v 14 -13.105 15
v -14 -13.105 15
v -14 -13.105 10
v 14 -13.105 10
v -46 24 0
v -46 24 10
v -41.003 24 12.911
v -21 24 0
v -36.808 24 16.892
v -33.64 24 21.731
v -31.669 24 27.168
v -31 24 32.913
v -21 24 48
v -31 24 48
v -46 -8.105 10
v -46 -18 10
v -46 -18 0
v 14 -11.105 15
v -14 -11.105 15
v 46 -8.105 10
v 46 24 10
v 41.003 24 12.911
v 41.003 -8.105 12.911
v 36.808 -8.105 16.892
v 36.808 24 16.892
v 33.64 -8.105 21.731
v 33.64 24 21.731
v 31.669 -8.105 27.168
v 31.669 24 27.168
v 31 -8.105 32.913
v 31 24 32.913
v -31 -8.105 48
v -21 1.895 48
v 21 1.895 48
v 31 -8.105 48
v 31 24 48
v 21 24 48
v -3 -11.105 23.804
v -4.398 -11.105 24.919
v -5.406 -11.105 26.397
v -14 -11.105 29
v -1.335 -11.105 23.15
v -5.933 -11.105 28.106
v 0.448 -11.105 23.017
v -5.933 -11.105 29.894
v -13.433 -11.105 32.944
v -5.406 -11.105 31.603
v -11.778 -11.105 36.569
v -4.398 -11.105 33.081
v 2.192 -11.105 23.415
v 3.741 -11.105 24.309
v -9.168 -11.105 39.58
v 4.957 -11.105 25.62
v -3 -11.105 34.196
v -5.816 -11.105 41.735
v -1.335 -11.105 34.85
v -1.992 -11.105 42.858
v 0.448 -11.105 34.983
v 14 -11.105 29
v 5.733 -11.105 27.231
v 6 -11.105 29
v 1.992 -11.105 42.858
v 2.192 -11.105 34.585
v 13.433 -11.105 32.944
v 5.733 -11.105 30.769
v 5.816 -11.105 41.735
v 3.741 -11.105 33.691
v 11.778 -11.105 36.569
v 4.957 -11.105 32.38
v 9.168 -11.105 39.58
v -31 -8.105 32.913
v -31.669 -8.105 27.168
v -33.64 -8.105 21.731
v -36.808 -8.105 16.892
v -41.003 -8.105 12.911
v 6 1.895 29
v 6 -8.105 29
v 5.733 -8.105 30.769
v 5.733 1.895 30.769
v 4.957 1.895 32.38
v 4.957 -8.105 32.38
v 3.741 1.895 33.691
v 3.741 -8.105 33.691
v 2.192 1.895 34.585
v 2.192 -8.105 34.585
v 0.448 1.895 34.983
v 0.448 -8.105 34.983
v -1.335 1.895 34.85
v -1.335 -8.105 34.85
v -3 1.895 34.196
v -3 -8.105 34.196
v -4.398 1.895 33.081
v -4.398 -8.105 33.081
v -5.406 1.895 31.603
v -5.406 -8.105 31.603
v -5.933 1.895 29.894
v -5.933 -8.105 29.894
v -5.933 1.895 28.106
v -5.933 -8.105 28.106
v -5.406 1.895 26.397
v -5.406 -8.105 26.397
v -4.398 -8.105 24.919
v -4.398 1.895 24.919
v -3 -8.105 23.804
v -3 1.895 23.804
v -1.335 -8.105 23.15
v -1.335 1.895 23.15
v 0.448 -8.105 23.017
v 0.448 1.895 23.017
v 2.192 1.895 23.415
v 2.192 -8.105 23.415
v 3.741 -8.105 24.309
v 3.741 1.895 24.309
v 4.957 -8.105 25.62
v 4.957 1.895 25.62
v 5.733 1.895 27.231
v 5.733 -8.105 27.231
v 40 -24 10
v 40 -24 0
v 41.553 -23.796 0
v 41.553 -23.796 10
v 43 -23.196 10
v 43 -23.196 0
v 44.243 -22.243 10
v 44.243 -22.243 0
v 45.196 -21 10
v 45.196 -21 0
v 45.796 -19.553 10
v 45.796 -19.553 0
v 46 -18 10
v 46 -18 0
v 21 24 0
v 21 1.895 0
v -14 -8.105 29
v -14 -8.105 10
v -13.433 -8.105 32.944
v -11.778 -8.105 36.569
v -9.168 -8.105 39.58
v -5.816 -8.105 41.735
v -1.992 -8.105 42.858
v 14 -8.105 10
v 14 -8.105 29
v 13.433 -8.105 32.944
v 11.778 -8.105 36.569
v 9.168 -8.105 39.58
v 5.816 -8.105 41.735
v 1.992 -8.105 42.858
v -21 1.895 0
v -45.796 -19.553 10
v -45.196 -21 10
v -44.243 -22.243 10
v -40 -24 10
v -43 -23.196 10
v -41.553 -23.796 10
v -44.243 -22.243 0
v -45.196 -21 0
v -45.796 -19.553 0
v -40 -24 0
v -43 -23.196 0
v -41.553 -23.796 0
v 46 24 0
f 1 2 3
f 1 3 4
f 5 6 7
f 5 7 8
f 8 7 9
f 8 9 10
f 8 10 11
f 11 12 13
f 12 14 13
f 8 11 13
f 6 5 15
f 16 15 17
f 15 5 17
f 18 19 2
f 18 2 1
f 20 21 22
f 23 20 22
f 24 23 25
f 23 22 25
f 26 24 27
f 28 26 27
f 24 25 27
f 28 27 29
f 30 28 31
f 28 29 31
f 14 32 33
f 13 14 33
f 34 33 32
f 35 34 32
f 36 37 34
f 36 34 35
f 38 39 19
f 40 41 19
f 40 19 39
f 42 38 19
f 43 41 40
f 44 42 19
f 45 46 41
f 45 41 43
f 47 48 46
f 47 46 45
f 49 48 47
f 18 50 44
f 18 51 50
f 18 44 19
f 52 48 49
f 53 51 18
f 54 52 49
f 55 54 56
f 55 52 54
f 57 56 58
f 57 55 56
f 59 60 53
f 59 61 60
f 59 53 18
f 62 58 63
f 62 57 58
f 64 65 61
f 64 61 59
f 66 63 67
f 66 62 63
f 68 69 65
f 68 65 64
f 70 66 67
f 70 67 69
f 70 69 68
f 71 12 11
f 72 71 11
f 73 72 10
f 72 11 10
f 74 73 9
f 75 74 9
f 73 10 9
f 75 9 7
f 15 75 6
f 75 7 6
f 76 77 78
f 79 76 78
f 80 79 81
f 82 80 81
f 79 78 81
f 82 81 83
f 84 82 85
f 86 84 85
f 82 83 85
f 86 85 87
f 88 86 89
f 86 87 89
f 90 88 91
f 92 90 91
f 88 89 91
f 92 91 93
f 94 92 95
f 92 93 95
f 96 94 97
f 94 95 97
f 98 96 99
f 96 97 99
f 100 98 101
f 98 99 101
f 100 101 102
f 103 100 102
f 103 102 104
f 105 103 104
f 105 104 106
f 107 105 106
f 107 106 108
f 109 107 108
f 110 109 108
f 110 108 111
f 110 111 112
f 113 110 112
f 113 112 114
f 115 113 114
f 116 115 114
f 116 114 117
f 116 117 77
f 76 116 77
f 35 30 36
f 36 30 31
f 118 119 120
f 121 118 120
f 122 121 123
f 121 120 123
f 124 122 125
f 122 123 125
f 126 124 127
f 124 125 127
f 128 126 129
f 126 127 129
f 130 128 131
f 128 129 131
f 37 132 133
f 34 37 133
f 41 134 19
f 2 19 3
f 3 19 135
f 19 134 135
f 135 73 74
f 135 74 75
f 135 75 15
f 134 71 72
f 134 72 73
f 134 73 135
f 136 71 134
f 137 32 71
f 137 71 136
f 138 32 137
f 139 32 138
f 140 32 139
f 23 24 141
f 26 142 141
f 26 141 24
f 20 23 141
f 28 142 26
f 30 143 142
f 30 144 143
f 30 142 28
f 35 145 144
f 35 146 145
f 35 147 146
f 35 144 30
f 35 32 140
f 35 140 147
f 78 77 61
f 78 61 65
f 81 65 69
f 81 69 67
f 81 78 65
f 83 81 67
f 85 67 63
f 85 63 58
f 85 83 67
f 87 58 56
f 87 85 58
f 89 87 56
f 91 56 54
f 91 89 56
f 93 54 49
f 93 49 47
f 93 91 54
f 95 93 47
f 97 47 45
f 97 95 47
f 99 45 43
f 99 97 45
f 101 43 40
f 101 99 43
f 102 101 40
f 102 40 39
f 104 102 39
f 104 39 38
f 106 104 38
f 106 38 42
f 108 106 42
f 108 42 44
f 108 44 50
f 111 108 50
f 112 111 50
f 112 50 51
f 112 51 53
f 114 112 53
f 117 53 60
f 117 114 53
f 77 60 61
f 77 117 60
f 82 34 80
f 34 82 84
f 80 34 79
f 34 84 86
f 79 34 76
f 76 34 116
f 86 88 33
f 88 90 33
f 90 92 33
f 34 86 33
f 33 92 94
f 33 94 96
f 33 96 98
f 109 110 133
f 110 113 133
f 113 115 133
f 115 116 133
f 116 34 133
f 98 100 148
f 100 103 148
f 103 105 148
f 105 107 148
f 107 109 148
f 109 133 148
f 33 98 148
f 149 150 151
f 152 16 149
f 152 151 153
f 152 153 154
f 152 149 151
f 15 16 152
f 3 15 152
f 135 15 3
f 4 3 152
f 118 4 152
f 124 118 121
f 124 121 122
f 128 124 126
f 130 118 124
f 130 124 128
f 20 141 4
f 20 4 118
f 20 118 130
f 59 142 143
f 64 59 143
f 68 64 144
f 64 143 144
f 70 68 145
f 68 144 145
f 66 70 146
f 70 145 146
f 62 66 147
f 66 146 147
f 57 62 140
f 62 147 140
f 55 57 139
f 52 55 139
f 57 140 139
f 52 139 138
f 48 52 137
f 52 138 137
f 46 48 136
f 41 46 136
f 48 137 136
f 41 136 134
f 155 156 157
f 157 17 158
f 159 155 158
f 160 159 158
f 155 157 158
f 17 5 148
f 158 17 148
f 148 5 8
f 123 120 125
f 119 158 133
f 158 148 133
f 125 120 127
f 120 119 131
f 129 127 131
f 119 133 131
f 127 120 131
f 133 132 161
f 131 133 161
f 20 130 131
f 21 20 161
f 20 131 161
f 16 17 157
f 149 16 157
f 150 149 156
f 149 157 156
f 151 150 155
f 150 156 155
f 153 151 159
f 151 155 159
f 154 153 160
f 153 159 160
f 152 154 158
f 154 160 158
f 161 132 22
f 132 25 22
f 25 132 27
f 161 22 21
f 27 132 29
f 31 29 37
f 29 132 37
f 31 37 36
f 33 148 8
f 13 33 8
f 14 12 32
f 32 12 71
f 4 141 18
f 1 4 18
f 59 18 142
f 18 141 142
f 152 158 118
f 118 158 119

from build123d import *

# Parameters (mm, degrees)
F1_DEPTH    = 48
F2_DEPTH    = 10
F3_T1_DEPTH = 32.1050237641
F4_T1_DEPTH = 32.1050237641
F5_W        = 28
F5_H        = 5
F6_DEPTH    = 5
F5_R        = 6
F7_DEPTH    = 3
F8_DEPTH    = 25


# Not quite as in the source:
# - a fillet or chamfer that OpenCascade refuses, or shapes differently, is made with other operations: its cross-section is extruded or revolved along the edge and cut away or added


with BuildPart() as f1:
    # F0 (on Top) → F1 (new body)
    with BuildSketch(Plane.XY):
        Polygon((31, -8.1050237641), (31, 24), (21, 24), (21, 1.8949762359), (-21, 1.8949762359), (-21, 24), (-31, 24), (-31, -8.1050237641), align=None)
    extrude(amount=F1_DEPTH)

    # F0 (on Top) → F2 (join)
    with BuildSketch(Plane.XY):
        with BuildLine():
            Line((-40, -24), (40, -24))
            ThreePointArc((40, -24), (44.2426406871, -22.2426406871), (46, -18))
            Line((46, -18), (46, 24))
            Line((46, 24), (31, 24))
            Line((31, 24), (31, -8.1050237641))
            Line((31, -8.1050237641), (-31, -8.1050237641))
            Line((-31, -8.1050237641), (-31, 24))
            Line((-31, 24), (-46, 24))
            Line((-46, 24), (-46, -18))
            ThreePointArc((-46, -18), (-44.2426406871, -22.2426406871), (-40, -24))
        make_face()
        Polygon((31, -8.1050237641), (31, 24), (21, 24), (21, 1.8949762359), (-21, 1.8949762359), (-21, 24), (-31, 24), (-31, -8.1050237641), align=None)
    extrude(amount=F2_DEPTH)

    # F3: fillet of radius 25 on 1 edges, made by hand

    # F3_s2 → F3_t1 (join)
    with BuildSketch(Plane.XZ.offset(-24)):
        with BuildLine():
            ThreePointArc((46, 10), (35.0834993366, 19.2198145372), (31, 32.9128784748))
            Line((31, 32.9128784748), (31, 10))
            Line((31, 10), (46, 10))
        make_face()
    extrude(amount=F3_T1_DEPTH)

    # F4: fillet of radius 25 on 1 edges, made by hand

    # F4_s2 → F4_t1 (join)
    with BuildSketch(Plane.XZ.offset(-24)):
        with BuildLine():
            ThreePointArc((-31, 32.9128784748), (-35.0834993366, 19.2198145372), (-46, 10))
            Line((-46, 10), (-31, 10))
            Line((-31, 10), (-31, 32.9128784748))
        make_face()
    extrude(amount=F4_T1_DEPTH)

    # F5 (on face) → F6 (join)
    with BuildSketch(Plane.XZ.offset(8.1050237641)):
        with Locations((0, 12.5)):
            Rectangle(F5_W, F5_H)
    extrude(amount=F6_DEPTH)

    # F5 (on face) → F7 (join)
    with BuildSketch(Plane.XZ.offset(8.1050237641)):
        with BuildLine():
            Line((14, 15), (14, 29))
            ThreePointArc((14, 29), (0, 43), (-14, 29))
            Line((-14, 29), (-14, 15))
            Line((-14, 15), (14, 15))
        make_face()
        with Locations((0, 29)):
            Circle(F5_R, mode=Mode.SUBTRACT)
    extrude(amount=F7_DEPTH)

    # F8 (cut): a face of the model
    f8_faces = [f1.faces().sort_by_distance(p)[0] for p in [
        (0, -8.1050237641, 29),
    ]]
    extrude(f8_faces, amount=-F8_DEPTH, mode=Mode.SUBTRACT)


solid = f1.part
